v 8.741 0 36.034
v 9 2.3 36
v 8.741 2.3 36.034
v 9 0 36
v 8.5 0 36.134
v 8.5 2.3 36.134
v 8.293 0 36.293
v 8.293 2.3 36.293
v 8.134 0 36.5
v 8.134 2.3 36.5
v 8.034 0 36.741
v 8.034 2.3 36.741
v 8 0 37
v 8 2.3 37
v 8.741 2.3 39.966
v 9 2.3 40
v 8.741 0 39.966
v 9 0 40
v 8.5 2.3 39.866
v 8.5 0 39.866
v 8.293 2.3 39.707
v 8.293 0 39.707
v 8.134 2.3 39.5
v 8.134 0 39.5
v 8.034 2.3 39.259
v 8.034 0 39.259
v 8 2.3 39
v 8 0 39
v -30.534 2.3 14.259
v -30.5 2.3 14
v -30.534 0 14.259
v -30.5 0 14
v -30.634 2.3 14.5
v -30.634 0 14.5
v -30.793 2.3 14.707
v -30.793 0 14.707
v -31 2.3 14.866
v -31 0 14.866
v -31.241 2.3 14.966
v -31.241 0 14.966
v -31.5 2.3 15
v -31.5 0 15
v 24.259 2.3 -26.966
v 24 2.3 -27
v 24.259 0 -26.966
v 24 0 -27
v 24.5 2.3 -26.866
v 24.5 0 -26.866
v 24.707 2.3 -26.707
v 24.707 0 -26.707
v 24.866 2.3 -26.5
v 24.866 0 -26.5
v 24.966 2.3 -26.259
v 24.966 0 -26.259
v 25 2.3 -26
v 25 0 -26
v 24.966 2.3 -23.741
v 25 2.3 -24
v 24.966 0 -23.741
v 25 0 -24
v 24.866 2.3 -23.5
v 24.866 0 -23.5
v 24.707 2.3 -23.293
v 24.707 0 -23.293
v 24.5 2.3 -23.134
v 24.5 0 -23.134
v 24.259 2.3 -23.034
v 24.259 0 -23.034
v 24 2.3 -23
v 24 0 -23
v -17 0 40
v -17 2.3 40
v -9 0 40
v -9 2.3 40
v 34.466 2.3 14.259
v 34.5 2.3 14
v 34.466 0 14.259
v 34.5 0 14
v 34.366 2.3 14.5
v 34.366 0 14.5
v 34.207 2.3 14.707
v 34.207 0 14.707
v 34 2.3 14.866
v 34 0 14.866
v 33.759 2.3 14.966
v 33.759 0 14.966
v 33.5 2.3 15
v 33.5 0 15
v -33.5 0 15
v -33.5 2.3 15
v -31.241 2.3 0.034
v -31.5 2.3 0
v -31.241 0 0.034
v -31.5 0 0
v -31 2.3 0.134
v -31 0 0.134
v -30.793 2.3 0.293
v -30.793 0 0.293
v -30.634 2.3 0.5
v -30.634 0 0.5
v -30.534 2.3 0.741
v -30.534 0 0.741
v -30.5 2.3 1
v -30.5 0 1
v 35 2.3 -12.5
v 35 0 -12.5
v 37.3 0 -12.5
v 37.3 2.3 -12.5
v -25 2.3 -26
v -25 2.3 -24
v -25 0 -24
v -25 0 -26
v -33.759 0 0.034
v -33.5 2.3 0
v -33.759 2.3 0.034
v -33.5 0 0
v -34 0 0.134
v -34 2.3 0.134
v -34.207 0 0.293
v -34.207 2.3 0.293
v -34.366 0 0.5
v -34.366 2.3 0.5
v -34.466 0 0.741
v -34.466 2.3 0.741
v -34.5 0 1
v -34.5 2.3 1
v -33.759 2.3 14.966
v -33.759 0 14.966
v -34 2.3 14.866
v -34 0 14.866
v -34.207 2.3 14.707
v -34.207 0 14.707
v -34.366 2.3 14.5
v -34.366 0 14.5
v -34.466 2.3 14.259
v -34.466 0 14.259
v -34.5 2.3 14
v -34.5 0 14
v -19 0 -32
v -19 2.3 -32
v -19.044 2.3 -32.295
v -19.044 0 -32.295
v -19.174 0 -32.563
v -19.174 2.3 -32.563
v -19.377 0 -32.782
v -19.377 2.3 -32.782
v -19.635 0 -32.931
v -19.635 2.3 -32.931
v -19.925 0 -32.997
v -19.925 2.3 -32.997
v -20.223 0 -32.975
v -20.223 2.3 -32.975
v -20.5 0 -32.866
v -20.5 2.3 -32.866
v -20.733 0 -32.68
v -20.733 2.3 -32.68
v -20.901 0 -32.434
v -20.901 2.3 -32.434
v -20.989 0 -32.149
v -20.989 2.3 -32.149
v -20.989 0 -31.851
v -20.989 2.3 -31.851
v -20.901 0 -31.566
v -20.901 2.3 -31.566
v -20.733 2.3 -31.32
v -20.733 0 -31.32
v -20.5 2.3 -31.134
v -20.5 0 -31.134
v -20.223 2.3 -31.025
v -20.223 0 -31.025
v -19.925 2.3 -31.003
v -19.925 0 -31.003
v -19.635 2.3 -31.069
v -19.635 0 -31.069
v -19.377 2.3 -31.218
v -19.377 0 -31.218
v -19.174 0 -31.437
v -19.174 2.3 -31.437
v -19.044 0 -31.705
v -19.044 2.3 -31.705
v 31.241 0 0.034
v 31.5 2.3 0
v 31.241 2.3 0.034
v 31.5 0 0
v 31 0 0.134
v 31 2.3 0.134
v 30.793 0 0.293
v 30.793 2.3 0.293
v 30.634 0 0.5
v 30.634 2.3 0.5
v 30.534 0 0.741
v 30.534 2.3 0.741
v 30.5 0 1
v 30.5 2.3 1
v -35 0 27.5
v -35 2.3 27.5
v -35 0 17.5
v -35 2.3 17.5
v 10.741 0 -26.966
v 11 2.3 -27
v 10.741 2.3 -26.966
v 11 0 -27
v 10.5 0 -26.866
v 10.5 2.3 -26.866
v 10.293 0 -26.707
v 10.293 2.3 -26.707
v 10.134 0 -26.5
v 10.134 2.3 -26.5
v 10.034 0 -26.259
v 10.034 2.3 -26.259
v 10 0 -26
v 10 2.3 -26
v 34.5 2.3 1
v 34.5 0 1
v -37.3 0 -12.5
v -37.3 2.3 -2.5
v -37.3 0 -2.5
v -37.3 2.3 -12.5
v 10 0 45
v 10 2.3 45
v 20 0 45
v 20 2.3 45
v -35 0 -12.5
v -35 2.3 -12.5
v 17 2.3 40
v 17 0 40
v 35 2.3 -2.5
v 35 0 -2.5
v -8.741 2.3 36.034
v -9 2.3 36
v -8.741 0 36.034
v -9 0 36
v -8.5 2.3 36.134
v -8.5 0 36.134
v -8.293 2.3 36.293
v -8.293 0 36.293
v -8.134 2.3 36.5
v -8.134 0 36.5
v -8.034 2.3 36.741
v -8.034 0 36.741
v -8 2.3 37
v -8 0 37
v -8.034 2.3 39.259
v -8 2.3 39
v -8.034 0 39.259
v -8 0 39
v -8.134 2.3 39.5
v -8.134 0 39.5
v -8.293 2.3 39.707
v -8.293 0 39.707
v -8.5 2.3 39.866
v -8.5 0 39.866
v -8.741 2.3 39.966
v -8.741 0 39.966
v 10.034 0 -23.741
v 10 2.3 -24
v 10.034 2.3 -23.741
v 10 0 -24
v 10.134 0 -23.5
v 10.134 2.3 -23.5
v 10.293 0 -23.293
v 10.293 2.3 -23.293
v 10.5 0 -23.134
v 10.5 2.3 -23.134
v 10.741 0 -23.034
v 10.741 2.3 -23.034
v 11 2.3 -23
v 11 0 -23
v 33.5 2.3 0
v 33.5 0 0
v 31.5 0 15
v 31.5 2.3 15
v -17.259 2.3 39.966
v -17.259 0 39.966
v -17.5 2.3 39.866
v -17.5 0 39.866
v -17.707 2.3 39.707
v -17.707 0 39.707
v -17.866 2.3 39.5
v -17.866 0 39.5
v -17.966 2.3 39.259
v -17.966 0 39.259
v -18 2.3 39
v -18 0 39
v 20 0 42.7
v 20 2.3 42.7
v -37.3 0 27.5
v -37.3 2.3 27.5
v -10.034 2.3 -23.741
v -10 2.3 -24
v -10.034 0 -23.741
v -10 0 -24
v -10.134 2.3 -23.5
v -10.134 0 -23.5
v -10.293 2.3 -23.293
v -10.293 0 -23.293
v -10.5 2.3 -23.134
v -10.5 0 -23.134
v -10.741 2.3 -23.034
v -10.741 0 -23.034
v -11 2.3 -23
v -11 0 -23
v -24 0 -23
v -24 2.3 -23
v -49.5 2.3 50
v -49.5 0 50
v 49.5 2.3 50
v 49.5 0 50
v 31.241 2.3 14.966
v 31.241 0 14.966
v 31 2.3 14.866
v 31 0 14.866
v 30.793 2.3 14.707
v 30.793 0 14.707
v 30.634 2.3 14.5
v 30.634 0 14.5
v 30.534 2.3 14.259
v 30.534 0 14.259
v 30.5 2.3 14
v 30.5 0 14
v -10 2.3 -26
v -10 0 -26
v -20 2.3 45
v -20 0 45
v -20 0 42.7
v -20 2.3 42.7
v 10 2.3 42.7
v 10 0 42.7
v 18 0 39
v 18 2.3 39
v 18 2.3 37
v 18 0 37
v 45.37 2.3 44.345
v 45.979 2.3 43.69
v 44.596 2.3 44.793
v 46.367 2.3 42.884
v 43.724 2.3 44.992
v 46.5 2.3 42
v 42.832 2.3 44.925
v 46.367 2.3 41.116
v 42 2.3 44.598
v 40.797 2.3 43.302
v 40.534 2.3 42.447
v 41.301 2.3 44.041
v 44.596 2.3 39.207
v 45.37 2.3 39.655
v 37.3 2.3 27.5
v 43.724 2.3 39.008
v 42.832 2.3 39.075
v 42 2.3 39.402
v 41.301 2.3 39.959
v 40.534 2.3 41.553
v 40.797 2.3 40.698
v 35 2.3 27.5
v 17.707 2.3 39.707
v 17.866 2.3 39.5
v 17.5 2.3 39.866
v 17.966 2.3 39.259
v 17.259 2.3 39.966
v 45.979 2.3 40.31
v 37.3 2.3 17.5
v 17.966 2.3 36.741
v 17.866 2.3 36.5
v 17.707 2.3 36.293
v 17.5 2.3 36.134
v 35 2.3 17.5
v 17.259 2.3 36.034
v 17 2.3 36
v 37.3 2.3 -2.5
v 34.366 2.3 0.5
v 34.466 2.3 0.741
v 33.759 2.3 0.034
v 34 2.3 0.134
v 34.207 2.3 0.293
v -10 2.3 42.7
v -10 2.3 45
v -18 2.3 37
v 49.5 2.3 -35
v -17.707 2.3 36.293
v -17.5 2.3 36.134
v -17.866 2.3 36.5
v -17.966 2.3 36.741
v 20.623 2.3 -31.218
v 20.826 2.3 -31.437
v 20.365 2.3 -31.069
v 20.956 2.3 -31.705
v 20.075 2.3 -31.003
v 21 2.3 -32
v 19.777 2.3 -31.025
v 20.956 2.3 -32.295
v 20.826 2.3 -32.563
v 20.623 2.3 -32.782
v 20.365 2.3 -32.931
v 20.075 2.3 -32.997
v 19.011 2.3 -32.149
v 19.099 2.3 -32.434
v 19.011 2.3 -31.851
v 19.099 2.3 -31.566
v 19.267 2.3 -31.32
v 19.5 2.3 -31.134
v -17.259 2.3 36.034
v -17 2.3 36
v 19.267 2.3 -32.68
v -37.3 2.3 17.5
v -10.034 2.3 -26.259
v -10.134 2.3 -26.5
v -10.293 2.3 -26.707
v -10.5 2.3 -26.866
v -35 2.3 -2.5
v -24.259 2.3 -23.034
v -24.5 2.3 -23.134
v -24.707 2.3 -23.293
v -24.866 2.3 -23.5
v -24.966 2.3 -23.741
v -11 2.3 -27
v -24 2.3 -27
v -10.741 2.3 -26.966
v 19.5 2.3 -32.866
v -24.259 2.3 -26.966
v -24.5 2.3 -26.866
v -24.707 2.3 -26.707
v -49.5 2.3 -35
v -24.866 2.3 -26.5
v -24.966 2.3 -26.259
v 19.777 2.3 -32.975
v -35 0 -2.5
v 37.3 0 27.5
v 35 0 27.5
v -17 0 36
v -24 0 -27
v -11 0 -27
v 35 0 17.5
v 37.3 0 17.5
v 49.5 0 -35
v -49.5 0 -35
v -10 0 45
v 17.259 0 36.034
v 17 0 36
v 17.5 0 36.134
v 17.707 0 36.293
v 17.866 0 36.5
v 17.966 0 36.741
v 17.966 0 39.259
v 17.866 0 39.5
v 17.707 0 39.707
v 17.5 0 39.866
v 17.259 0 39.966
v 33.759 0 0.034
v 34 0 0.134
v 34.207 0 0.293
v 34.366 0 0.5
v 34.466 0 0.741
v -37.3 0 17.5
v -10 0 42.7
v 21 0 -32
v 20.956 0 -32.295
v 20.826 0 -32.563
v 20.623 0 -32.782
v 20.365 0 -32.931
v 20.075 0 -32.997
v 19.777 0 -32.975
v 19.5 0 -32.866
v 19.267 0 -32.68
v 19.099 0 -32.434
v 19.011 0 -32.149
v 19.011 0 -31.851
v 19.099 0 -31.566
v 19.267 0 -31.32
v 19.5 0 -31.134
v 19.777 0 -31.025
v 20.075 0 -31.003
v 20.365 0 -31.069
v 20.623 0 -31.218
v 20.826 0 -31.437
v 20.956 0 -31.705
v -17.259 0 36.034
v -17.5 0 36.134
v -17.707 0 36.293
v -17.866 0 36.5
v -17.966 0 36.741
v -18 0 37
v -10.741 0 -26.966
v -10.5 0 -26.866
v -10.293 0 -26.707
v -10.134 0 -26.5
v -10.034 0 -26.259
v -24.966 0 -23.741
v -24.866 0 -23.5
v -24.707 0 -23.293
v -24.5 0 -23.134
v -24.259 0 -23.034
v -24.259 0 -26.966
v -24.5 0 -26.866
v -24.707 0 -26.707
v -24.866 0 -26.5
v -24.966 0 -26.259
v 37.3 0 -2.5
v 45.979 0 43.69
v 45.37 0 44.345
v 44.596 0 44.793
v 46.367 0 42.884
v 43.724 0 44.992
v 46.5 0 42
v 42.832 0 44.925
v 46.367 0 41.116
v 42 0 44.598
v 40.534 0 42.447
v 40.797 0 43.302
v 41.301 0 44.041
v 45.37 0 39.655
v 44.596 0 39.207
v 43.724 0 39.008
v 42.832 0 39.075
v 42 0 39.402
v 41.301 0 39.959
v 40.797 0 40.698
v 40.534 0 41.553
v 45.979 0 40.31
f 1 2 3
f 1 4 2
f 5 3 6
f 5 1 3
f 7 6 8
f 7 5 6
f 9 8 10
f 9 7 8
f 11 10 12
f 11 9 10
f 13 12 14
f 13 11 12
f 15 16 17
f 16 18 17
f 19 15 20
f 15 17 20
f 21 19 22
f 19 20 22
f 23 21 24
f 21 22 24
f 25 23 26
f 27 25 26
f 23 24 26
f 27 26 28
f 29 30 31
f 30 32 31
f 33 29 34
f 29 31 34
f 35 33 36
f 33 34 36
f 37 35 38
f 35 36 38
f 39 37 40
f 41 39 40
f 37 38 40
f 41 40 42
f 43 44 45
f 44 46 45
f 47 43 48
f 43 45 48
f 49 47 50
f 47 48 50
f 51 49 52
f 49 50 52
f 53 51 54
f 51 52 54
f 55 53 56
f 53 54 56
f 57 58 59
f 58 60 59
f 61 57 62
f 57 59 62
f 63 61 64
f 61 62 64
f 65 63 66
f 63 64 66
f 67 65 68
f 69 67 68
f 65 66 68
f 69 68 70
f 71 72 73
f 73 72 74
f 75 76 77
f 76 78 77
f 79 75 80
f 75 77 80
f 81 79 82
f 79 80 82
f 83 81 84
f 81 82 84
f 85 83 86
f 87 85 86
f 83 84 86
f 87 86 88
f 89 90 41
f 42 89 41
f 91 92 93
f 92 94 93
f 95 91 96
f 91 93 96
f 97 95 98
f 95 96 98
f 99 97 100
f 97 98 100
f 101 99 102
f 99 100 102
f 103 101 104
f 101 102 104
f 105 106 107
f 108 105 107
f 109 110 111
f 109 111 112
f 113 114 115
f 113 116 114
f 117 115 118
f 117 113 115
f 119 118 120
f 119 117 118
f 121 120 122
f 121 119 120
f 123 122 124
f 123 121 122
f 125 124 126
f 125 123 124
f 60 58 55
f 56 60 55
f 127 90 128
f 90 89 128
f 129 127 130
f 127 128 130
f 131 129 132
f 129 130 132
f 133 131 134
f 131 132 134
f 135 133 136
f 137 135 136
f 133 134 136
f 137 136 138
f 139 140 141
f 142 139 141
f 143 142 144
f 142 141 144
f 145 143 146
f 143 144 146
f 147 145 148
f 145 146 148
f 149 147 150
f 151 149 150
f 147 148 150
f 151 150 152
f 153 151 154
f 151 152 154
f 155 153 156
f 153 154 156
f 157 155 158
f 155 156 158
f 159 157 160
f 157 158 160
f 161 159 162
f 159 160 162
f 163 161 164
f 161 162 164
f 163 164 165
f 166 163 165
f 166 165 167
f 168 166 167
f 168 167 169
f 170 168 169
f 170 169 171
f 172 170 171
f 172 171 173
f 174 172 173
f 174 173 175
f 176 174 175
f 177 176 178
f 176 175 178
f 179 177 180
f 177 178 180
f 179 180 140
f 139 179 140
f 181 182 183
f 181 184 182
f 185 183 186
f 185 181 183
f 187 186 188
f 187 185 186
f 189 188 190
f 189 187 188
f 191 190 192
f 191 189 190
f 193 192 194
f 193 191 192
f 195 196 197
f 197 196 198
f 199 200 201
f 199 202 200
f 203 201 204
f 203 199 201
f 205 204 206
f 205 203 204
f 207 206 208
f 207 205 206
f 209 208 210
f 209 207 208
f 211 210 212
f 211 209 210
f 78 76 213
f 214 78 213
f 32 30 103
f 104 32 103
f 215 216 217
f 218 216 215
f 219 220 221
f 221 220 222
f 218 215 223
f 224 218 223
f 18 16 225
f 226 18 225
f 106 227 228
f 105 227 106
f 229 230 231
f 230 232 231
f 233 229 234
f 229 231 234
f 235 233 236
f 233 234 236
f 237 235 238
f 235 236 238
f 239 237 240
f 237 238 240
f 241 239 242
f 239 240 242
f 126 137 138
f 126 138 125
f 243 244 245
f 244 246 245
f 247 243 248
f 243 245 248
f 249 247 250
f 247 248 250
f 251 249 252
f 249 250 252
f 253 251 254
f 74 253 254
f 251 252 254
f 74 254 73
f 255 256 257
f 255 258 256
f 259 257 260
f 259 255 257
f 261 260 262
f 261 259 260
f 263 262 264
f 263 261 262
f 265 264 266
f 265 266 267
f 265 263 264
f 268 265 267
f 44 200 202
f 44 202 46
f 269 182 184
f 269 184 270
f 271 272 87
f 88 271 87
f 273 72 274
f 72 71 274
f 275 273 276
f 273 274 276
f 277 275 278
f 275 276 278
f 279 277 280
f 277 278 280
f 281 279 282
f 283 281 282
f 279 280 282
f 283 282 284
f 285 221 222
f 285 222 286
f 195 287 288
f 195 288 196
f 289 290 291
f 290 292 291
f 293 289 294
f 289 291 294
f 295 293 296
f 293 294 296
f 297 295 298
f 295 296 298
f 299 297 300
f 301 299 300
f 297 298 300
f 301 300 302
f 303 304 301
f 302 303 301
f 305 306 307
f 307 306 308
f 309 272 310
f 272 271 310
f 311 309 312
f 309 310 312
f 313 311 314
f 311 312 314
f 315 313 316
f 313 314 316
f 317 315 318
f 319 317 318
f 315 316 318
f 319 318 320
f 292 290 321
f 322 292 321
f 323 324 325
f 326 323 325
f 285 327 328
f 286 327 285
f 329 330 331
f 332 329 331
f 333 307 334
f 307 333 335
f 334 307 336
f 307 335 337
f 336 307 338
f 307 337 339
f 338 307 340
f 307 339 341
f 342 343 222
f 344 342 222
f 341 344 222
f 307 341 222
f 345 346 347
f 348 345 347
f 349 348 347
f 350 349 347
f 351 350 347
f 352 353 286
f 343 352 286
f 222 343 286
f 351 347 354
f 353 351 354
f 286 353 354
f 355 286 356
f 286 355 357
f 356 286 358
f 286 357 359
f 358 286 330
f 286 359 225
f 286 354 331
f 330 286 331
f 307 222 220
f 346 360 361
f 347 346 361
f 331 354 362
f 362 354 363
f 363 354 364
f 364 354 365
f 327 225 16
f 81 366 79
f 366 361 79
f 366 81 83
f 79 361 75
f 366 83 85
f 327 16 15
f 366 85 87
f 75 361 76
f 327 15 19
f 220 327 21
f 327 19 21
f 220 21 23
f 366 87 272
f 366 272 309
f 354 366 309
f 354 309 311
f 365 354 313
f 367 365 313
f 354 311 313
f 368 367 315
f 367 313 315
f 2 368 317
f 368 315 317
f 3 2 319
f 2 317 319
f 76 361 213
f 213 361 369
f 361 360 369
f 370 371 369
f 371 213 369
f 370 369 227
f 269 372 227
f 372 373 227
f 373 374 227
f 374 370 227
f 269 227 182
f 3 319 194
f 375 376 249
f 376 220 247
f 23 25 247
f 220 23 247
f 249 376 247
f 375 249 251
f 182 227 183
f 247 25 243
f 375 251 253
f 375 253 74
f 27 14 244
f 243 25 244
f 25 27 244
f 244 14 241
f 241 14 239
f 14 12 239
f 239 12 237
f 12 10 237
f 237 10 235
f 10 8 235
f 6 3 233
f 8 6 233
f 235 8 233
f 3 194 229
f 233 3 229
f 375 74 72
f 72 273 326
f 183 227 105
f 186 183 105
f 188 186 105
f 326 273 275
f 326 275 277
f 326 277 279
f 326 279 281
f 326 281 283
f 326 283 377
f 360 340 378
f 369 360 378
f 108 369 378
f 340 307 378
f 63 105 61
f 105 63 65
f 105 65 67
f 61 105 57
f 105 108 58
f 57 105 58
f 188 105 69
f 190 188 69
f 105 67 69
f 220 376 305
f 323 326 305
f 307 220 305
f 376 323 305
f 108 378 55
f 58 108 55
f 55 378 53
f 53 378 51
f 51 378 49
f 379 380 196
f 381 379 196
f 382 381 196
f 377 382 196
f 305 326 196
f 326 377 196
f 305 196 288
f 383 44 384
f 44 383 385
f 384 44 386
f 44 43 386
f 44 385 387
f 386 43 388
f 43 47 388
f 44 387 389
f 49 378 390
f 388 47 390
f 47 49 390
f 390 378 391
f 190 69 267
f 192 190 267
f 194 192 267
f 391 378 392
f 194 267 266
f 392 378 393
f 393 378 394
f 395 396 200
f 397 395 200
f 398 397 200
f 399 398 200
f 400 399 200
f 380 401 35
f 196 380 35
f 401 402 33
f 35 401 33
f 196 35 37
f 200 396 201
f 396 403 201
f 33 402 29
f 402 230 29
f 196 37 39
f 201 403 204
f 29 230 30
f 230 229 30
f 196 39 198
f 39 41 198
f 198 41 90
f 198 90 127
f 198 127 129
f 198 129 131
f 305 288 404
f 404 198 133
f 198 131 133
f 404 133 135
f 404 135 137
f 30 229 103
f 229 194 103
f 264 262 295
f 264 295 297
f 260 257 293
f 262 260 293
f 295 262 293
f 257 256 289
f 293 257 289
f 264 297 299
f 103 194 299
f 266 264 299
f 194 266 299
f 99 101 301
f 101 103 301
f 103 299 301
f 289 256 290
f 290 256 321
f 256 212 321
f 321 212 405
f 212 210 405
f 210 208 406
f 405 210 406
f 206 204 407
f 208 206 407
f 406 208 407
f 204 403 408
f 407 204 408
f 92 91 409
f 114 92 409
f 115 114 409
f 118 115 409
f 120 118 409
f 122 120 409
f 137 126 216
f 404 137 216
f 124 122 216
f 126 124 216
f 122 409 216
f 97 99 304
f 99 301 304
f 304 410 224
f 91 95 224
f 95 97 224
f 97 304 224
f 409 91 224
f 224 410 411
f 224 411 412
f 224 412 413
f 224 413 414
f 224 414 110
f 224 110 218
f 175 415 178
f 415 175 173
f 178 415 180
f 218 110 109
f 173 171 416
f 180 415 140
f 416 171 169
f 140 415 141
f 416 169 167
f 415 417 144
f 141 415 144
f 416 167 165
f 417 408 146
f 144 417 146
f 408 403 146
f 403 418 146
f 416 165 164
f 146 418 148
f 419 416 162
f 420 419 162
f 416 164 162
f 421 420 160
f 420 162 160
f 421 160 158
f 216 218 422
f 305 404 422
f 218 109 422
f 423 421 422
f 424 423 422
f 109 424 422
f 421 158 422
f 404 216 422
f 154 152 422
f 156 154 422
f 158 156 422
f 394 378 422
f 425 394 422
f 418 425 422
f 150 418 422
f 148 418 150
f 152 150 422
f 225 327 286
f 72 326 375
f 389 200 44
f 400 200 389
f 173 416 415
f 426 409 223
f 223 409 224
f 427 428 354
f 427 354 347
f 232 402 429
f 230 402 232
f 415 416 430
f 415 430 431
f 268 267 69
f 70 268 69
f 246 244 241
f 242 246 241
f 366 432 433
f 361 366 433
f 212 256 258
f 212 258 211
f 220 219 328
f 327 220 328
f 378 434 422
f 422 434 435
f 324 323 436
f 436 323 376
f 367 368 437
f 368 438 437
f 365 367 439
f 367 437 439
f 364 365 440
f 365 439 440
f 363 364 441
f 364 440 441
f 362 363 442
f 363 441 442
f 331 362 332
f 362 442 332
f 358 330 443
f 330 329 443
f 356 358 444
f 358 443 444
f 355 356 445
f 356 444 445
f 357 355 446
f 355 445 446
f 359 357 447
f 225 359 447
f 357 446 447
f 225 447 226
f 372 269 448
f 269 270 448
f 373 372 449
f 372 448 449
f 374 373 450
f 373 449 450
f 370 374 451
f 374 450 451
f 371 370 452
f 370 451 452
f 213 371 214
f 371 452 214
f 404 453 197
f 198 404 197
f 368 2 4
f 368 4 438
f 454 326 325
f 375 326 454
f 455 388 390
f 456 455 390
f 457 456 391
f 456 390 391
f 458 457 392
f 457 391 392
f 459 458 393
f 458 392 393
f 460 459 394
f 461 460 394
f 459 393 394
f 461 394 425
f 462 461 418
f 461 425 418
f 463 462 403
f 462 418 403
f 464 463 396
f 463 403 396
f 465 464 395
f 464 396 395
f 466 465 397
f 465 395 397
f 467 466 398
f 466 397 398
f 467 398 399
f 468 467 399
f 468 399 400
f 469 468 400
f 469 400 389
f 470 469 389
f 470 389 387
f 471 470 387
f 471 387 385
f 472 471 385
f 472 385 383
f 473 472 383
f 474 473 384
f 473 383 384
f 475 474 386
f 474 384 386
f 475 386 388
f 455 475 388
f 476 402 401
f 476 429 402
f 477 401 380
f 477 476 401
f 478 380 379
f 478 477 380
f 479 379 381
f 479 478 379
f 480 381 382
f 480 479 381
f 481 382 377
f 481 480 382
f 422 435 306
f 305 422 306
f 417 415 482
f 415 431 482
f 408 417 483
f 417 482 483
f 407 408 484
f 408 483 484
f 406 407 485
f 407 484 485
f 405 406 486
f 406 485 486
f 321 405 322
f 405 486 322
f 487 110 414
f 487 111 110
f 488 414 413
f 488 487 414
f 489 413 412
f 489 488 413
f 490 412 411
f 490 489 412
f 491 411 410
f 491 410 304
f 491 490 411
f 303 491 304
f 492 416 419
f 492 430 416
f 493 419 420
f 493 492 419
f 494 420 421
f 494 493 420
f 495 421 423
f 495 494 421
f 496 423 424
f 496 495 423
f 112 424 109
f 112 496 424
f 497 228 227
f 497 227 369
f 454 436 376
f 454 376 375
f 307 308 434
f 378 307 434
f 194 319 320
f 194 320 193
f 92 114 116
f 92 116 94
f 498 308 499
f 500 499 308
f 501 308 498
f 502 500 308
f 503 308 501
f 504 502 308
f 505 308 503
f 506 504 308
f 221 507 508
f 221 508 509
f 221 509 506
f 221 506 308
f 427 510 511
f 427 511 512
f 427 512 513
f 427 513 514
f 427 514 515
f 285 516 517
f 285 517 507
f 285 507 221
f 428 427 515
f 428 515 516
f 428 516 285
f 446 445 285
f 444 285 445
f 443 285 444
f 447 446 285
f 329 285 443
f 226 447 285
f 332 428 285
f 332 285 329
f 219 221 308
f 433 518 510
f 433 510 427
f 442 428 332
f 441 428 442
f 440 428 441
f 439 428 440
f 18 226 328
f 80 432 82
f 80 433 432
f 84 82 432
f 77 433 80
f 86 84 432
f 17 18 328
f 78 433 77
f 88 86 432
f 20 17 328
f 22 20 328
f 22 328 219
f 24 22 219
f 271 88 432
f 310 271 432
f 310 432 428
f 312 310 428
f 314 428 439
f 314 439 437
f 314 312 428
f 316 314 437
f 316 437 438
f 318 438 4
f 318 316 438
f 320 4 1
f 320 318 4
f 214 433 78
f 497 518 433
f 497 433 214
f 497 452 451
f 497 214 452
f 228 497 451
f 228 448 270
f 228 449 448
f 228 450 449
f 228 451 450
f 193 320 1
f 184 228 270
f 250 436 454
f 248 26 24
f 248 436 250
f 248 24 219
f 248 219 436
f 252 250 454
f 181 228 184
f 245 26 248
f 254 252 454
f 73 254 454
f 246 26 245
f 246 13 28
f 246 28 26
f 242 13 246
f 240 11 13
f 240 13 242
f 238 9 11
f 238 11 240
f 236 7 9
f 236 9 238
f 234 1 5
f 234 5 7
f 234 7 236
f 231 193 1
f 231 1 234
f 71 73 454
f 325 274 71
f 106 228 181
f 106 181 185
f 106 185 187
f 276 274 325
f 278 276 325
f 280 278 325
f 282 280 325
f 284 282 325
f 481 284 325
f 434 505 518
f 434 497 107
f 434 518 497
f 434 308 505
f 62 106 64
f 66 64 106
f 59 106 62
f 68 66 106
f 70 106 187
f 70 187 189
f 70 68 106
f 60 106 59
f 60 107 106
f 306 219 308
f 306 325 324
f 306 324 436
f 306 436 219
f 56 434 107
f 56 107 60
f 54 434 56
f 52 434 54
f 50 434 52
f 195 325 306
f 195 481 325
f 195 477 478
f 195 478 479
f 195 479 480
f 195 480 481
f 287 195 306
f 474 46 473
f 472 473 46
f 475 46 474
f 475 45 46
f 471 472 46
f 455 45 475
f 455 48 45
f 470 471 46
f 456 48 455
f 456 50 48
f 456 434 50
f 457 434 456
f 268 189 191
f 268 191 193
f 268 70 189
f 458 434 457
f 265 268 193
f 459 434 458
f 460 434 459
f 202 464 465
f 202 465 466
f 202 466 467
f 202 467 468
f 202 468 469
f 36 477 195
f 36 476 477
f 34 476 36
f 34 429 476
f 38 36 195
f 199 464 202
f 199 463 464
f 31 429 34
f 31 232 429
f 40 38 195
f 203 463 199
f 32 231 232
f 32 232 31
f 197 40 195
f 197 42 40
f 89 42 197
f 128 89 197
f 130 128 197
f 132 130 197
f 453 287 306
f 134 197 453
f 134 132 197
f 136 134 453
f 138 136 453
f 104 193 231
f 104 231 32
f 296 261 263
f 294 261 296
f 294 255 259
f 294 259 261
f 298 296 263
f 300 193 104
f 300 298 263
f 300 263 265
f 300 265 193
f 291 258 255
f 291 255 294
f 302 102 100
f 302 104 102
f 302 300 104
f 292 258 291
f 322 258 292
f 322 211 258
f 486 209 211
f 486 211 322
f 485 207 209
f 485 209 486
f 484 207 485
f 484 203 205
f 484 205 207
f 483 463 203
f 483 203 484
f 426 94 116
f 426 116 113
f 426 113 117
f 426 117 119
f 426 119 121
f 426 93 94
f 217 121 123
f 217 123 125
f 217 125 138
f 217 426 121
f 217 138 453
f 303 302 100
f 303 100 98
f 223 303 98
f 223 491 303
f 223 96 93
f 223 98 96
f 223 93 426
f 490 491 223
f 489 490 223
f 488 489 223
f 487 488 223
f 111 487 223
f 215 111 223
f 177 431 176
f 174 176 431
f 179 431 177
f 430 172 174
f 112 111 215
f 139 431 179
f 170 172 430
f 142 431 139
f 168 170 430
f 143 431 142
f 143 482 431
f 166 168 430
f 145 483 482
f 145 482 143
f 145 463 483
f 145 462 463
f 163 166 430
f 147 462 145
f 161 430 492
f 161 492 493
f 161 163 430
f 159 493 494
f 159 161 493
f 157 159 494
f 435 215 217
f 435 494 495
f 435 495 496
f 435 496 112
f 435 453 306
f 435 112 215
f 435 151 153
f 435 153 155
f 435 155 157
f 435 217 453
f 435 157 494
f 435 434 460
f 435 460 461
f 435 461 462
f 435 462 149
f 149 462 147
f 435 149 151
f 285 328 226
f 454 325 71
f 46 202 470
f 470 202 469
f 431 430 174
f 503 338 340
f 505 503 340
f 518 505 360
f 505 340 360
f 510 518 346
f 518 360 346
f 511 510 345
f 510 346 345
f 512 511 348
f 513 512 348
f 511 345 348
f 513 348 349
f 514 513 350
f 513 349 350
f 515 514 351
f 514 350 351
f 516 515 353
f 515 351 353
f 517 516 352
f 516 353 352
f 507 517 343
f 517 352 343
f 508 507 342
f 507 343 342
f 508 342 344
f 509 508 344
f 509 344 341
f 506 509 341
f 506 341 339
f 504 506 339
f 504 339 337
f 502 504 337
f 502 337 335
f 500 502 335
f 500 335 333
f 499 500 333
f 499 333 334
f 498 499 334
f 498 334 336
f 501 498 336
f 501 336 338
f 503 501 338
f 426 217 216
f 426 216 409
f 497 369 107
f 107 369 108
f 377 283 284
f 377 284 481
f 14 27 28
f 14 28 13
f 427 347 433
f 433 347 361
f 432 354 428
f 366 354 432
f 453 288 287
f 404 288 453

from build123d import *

# Parameters (mm, degrees)
BOSS_EXTRUDE1_DEPTH = 2.3
SKETCH2_R           = 1
CUT_EXTRUDE1_DEPTH  = 2.3
SKETCH3_W           = 10
SKETCH3_H           = 2.3
CUT_EXTRUDE2_DEPTH  = 2.3
SKETCH4_W           = 15
SKETCH4_H           = 4
CUT_EXTRUDE3_DEPTH  = 10
SKETCH5_W           = 2.3
SKETCH5_H           = 10
CUT_EXTRUDE4_DEPTH  = 2.3
FILLET1_R           = 1
SKETCH6_W           = 4
SKETCH6_H           = 15
SKETCH6_W_2         = 10
SKETCH6_H_2         = 4
CUT_EXTRUDE5_DEPTH  = 10
FILLET3_R           = 1
SKETCH7_R           = 3
CUT_EXTRUDE6_DEPTH  = 10


with BuildPart() as part:
    # Sketch1 → Boss-Extrude1 (new body)
    with BuildSketch(Plane(origin=(0, 0, 0), x_dir=(1, 0, 0), z_dir=(0, 1, 0))):
        Polygon((0, -50), (-49.5, -50), (-49.5, 0), (-49.5, 35), (0, 35), (49.5, 35), (49.5, 0), (49.5, -50), align=None)
    extrude(amount=BOSS_EXTRUDE1_DEPTH)

    # Sketch2 → Cut-Extrude1 (cut)
    with BuildSketch(Plane(origin=(0, 2.3, 0), x_dir=(1, 0, 0), z_dir=(0, 1, 0))):
        with Locations((-20, 32)):
            Circle(SKETCH2_R)
        with Locations((20, 32)):
            Circle(SKETCH2_R)
    extrude(amount=-CUT_EXTRUDE1_DEPTH, mode=Mode.SUBTRACT)

    # Sketch3 → Cut-Extrude2 (cut)
    with BuildSketch(Plane(origin=(0, 2.3, 0), x_dir=(1, 0, 0), z_dir=(0, 1, 0))):
        with Locations((-15, -43.85)):
            Rectangle(SKETCH3_W, SKETCH3_H)
        with Locations((15, -43.85)):
            Rectangle(SKETCH3_W, SKETCH3_H)
    extrude(amount=-CUT_EXTRUDE2_DEPTH, mode=Mode.SUBTRACT)

    # Sketch4 → Cut-Extrude3 (cut)
    with BuildSketch(Plane(origin=(0, 2.3, 0), x_dir=(1, 0, 0), z_dir=(0, 1, 0))):
        with Locations((-17.5, 25)):
            Rectangle(SKETCH4_W, SKETCH4_H)
        with Locations((17.5, 25)):
            Rectangle(SKETCH4_W, SKETCH4_H)
    extrude(amount=-CUT_EXTRUDE3_DEPTH, mode=Mode.SUBTRACT)

    # Sketch5 → Cut-Extrude4 (cut)
    with BuildSketch(Plane(origin=(0, 2.3, 0), x_dir=(1, 0, 0), z_dir=(0, 1, 0))):
        with Locations((-36.15, 7.5)):
            Rectangle(SKETCH5_W, SKETCH5_H)
        with Locations((-36.15, -22.5)):
            Rectangle(SKETCH5_W, SKETCH5_H)
        with Locations((36.15, -22.5)):
            Rectangle(SKETCH5_W, SKETCH5_H)
        with Locations((36.15, 7.5)):
            Rectangle(SKETCH5_W, SKETCH5_H)
    extrude(amount=-CUT_EXTRUDE4_DEPTH, mode=Mode.SUBTRACT)

    # Fillet1
    fillet1_edges = [part.edges().sort_by_distance(p)[0] for p in [
        (-25, 1.15, -23),
        (-25, 1.15, -27),
        (-10, 1.15, -27),
        (-10, 1.15, -23),
        (10, 1.15, -23),
        (10, 1.15, -27),
        (25, 1.15, -27),
        (25, 1.15, -23),
    ]]
    fillet(fillet1_edges, radius=FILLET1_R)

    # Sketch6 → Cut-Extrude5 (cut)
    with BuildSketch(Plane(origin=(0, 2.3, 0), x_dir=(1, 0, 0), z_dir=(0, 1, 0))):
        with Locations((32.5, -7.5)):
            Rectangle(SKETCH6_W, SKETCH6_H)
        with Locations((-32.5, -7.5)):
            Rectangle(SKETCH6_W, SKETCH6_H)
        with Locations((-13, -38)):
            Rectangle(SKETCH6_W_2, SKETCH6_H_2)
        with Locations((13, -38)):
            Rectangle(SKETCH6_W_2, SKETCH6_H_2)
    extrude(amount=-CUT_EXTRUDE5_DEPTH, mode=Mode.SUBTRACT)

    # Fillet3
    fillet3_edges = [part.edges().sort_by_distance(p)[0] for p in [
        (-34.5, 1.15, 15),
        (-34.5, 1.15, 0),
        (-30.5, 1.15, 0),
        (-30.5, 1.15, 15),
        (34.5, 1.15, 15),
        (30.5, 1.15, 15),
        (30.5, 1.15, 0),
        (34.5, 1.15, 0),
        (-8, 1.15, 36),
        (-8, 1.15, 40),
        (-18, 1.15, 40),
        (-18, 1.15, 36),
        (8, 1.15, 40),
        (8, 1.15, 36),
        (18, 1.15, 36),
        (18, 1.15, 40),
    ]]
    fillet(fillet3_edges, radius=FILLET3_R)

    # Sketch7 → Cut-Extrude6 (cut)
    with BuildSketch(Plane(origin=(0, 2.3, 0), x_dir=(1, 0, 0), z_dir=(0, 1, 0))):
        with Locations((43.5, -42)):
            Circle(SKETCH7_R)
    extrude(amount=-CUT_EXTRUDE6_DEPTH, mode=Mode.SUBTRACT)


solid = part.part
